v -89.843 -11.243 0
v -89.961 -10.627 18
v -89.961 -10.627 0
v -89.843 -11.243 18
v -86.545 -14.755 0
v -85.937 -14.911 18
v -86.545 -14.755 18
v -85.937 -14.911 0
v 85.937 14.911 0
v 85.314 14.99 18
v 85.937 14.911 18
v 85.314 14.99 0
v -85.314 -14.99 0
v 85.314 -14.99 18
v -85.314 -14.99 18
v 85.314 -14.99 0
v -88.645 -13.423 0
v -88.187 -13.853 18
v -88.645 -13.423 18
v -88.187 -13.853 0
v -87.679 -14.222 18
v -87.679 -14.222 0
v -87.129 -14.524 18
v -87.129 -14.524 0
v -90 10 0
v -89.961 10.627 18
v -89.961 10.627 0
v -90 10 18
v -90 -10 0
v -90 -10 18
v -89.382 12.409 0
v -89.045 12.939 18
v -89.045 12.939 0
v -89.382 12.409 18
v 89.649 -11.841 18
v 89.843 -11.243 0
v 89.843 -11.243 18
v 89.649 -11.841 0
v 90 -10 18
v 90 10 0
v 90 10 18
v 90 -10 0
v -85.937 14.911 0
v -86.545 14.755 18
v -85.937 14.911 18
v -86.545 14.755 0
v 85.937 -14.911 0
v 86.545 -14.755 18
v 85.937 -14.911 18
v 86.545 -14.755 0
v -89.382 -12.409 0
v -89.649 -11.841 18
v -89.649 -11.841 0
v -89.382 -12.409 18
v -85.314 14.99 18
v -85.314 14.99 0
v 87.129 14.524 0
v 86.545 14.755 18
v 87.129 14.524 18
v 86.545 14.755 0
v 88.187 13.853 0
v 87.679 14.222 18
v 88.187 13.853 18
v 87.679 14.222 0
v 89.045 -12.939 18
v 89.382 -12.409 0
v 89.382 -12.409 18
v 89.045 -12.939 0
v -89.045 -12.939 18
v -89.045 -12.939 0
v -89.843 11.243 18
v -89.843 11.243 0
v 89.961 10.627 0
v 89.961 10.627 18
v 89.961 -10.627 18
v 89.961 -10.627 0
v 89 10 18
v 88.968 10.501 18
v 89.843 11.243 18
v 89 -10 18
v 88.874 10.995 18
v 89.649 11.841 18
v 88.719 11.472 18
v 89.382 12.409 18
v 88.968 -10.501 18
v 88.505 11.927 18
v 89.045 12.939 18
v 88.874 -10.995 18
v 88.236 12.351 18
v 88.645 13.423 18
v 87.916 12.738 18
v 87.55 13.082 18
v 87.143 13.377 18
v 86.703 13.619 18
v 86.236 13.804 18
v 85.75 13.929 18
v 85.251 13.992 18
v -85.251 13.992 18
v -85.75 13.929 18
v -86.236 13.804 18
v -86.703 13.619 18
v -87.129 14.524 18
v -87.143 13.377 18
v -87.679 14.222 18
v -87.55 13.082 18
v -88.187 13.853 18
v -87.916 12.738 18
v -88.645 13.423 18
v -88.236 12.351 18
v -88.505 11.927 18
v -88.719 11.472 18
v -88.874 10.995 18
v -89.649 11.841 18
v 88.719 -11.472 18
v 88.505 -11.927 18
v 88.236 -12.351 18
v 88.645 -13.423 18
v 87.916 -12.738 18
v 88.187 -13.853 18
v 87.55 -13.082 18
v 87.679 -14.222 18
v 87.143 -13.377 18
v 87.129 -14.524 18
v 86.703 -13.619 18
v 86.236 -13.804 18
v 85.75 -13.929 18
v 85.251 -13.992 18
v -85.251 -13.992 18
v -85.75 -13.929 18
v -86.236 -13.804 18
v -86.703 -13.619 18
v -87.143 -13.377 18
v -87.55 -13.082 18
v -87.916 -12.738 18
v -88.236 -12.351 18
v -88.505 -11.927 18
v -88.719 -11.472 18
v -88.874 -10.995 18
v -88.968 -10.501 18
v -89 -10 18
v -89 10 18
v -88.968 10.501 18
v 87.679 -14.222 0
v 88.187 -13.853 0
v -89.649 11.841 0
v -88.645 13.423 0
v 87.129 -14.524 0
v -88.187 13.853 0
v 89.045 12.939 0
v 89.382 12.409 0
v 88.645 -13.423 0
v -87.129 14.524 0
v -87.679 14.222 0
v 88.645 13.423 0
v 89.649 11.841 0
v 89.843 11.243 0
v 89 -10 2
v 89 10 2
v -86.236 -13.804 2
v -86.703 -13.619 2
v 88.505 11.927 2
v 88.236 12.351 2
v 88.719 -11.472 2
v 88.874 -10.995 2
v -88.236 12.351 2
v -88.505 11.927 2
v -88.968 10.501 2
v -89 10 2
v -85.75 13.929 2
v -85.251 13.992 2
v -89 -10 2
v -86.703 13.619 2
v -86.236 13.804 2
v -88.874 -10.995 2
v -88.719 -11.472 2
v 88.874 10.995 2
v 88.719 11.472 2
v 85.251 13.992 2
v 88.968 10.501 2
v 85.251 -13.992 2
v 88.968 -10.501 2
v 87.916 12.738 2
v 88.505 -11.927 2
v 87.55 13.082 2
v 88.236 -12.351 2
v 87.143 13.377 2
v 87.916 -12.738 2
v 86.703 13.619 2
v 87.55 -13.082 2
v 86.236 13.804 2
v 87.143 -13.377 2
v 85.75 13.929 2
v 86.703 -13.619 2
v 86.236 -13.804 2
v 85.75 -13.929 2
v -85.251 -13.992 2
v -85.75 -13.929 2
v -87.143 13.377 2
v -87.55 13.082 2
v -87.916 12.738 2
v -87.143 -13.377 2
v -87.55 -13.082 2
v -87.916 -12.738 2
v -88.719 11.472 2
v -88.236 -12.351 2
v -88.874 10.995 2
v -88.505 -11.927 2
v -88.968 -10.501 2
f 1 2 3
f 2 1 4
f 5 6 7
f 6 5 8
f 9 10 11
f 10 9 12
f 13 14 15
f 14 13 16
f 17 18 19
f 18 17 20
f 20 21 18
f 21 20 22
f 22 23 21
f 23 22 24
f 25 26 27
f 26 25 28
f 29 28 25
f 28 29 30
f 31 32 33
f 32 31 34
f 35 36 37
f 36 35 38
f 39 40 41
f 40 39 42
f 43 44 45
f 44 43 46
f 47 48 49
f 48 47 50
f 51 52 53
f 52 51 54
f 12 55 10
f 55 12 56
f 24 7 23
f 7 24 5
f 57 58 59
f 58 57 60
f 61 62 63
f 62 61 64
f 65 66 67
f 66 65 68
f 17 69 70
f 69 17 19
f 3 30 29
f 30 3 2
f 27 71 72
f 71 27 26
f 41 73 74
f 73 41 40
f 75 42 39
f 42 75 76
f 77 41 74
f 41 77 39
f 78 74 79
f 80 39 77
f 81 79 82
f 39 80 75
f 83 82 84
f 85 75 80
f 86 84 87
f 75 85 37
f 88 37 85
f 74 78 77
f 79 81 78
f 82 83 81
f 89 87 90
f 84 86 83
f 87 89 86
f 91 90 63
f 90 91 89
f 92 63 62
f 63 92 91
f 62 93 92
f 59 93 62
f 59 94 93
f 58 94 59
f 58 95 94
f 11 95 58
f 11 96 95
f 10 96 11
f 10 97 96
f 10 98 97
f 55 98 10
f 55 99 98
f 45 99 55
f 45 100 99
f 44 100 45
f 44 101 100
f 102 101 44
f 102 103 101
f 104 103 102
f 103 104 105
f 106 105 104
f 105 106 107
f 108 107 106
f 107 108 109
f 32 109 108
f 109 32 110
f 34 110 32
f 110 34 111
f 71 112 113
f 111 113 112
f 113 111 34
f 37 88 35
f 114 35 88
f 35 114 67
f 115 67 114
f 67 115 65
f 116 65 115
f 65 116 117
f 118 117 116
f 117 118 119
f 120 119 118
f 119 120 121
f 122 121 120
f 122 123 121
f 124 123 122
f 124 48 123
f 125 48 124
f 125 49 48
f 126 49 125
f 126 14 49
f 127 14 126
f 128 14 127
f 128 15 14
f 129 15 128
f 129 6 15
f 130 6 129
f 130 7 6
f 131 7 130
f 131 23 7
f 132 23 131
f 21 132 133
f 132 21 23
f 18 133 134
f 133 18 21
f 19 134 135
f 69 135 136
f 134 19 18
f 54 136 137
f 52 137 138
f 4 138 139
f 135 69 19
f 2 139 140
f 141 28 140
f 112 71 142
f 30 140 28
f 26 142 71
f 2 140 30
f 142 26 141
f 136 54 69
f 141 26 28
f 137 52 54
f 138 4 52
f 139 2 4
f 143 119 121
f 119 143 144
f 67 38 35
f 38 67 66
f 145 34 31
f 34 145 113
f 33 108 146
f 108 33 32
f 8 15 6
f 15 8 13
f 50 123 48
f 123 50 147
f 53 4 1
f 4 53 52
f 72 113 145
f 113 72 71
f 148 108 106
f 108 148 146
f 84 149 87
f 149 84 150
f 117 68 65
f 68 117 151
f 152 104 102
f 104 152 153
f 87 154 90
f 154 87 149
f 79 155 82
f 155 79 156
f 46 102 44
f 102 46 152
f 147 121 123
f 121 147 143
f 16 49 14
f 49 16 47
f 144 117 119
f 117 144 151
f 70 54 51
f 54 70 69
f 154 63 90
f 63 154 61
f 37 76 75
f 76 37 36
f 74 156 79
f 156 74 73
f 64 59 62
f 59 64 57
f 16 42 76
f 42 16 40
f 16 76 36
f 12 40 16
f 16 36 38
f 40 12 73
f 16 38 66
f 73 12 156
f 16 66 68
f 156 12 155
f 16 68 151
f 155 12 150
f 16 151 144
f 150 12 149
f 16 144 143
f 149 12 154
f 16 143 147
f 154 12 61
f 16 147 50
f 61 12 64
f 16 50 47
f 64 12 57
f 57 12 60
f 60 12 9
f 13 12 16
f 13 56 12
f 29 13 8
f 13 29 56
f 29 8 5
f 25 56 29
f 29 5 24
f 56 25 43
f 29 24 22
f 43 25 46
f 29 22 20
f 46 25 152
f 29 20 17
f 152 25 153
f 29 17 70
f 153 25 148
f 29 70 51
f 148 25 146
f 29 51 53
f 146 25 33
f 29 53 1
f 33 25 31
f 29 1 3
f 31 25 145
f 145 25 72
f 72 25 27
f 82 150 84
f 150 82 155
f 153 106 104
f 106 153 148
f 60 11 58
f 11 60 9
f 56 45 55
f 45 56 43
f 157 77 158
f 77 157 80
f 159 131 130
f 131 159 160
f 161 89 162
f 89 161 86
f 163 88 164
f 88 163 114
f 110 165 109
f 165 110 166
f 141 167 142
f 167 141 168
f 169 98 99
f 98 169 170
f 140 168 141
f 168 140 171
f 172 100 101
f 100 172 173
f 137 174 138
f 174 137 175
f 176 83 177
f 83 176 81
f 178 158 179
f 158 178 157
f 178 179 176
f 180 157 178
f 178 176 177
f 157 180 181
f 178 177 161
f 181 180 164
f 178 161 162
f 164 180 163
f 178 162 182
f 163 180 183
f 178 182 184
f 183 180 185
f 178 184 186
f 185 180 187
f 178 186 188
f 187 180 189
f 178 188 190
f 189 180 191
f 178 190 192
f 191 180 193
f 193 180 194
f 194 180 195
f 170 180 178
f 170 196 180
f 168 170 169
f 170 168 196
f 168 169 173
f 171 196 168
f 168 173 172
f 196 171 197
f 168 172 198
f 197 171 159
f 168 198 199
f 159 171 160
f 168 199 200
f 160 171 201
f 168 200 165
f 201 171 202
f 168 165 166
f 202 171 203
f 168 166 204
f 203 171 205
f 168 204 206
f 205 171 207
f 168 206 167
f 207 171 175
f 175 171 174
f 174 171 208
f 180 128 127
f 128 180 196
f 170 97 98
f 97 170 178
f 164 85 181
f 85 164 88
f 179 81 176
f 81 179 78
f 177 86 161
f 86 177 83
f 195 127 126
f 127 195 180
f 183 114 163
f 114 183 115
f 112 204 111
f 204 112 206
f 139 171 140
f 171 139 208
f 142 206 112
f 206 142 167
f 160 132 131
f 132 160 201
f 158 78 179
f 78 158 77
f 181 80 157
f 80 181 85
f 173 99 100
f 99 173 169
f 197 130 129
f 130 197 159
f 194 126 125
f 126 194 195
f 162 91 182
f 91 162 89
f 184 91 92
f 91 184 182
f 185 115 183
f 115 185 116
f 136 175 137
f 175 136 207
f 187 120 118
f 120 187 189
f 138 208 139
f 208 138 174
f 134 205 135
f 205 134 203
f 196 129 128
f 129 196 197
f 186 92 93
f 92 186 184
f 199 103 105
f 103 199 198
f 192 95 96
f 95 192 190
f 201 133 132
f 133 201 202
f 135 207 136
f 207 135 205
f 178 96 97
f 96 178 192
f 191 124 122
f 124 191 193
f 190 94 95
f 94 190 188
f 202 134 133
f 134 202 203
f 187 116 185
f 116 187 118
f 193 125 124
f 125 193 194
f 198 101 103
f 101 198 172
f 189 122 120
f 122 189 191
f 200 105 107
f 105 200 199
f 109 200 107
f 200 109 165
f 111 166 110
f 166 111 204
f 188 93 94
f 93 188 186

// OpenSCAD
$fn = 50;


difference() {
	union() {
		hull() {
			translate(v = [-85.0000000000, 10.0000000000, 0]) {
				cylinder(h = 18, r = 5);
			}
			translate(v = [85.0000000000, 10.0000000000, 0]) {
				cylinder(h = 18, r = 5);
			}
			translate(v = [-85.0000000000, -10.0000000000, 0]) {
				cylinder(h = 18, r = 5);
			}
			translate(v = [85.0000000000, -10.0000000000, 0]) {
				cylinder(h = 18, r = 5);
			}
		}
	}
	union() {
		translate(v = [0, 0, 2]) {
			hull() {
				translate(v = [-85.0000000000, 10.0000000000, 0]) {
					cylinder(h = 16, r = 4);
				}
				translate(v = [85.0000000000, 10.0000000000, 0]) {
					cylinder(h = 16, r = 4);
				}
				translate(v = [-85.0000000000, -10.0000000000, 0]) {
					cylinder(h = 16, r = 4);
				}
				translate(v = [85.0000000000, -10.0000000000, 0]) {
					cylinder(h = 16, r = 4);
				}
			}
		}
	}
}
